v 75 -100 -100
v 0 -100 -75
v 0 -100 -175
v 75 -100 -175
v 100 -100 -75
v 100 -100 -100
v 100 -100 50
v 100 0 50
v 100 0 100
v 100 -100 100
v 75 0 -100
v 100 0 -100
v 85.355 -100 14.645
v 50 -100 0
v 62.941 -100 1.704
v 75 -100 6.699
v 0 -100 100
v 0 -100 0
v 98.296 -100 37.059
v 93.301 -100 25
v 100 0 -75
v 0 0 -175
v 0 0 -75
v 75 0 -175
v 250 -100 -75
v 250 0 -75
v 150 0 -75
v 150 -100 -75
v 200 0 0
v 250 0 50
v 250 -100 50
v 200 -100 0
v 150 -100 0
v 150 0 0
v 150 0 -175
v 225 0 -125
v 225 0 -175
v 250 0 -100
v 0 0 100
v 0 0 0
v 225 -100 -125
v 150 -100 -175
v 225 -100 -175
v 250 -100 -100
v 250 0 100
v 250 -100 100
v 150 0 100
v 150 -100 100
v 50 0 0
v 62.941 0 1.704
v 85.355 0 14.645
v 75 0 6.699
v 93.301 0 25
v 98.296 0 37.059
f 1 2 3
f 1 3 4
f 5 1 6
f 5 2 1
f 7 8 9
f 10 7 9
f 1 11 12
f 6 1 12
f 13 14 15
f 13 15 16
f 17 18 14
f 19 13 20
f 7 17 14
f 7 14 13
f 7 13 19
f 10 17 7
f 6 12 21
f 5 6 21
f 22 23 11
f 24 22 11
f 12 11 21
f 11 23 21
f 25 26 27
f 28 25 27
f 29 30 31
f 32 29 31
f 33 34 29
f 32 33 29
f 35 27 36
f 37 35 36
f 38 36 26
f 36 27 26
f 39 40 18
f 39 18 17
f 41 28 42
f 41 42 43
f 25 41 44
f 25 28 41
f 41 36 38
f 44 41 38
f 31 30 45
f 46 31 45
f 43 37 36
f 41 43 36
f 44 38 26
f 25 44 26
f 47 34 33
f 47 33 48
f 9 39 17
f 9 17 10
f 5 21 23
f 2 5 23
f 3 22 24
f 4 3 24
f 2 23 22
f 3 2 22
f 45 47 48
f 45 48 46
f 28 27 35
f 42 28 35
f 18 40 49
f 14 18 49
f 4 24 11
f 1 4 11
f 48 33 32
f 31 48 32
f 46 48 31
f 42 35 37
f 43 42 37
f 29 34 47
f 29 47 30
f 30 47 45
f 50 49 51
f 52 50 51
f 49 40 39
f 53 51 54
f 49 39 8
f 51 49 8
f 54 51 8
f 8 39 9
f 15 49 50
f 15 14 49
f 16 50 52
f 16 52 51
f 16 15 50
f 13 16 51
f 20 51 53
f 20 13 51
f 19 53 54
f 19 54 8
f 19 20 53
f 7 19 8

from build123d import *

# Parameters (mm, degrees)
SKETCH_W     = 100
SKETCH_H     = 100
PAD_DEPTH    = 100
FILLET_R     = 50
CHAMFER_SIZE = 50


with BuildPart() as part:
    # Sketch → Pad (new body)
    with BuildSketch(Plane.XZ):
        with Locations((50, 50)):
            Rectangle(SKETCH_W, SKETCH_H)
        with Locations((200, 50)):
            Rectangle(SKETCH_W, SKETCH_H)
        Polygon((0, -75), (0, -175), (75, -175), (75, -100), (100, -100), (100, -75), align=None)
        Polygon((150, -75), (150, -175), (225, -175), (225, -125), (250, -100), (250, -75), align=None)
    extrude(amount=PAD_DEPTH)

    # Fillet
    fillet_edges = [part.edges().sort_by_distance(p)[0] for p in [
        (100, -50, 0),
    ]]
    fillet(fillet_edges, radius=FILLET_R)

    # Chamfer
    chamfer_edges = [part.edges().sort_by_distance(p)[0] for p in [
        (250, -50, 0),
    ]]
    chamfer(chamfer_edges, length=CHAMFER_SIZE)


solid = part.part
